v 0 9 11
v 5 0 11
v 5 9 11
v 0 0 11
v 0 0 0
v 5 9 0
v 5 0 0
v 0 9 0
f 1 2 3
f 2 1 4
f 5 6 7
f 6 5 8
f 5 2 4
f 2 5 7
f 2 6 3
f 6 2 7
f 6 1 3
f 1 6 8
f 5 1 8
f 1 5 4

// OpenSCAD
// Generated by SolidPython 1.0.1 on 2020-07-29 00:39:26


cube(size = [5, 9, 11]);
/***********************************************
*********      SolidPython code:      **********
************************************************
 
# import packages: SolidPython
from solid import *
from solid.utils import *
from itertools import chain, combinations


class Resize:

    def __init__(self, scad_file):
        self.scad_file = scad_file
        #self.scad_file = import_scad(scad_file)
        # cone/cylinder param:
        self.r1 = 0
        self.r2 = 0
        self.h = 0
        # rectangular prism param:
        self.w = 0
        self.l = 0
        # ellipse param:
        self.r = 0

    # import OpenScad code (file name corresponds to shape)


    # classify shape + parameters
    def assign(self, param1, param2, param3):
        if self.scad_file == 'cone.scad':
            self.r1 = param1
            self.r2 = param2
            self.h = param3
        elif self.scad_file == 'cylinder.scad':
            self.r1 = param1
            self.r2 = param2
            self.h = param3
        elif self.scad_file == 'rectangularPrism.scad':
            self.h = param1
            self.l = param2
            self.w = param3
        else:
            self.r = param1
            self.h = param2

    # resize parameters
    def iterate(self):
        x = range(3, 20, 2)
        i = 1
        if self.scad_file == 'cone.scad':
            tempList = list(combinations(x, 2))
            for temp in tempList:
                param1 = temp[0]
                param2 = temp[1]
                filepath = 'produced_scad_files/' + 'cone' + str(param1) + '_' + str(param2) + '_' + '.scad'
                scad_render_to_file(cylinder(h=param1, r1=param2, r2=0), filepath)

        elif self.scad_file == 'cylinder.scad':
            tempList = list(combinations(x, 3))
            for temp in tempList:
                param1 = temp[0]
                param2 = temp[1]
                filepath = 'produced_scad_files/' + 'cylinder' + str(param1) + '_' + str(param2) + '_' + '.scad'
                scad_render_to_file(cylinder(h=param1, r1=param2, r2=param2), filepath)

        elif self.scad_file == 'rectangularPrism.scad':
            tempList = list(combinations(x, 3))
            for temp in tempList:
                param1 = temp[0]
                param2 = temp[1]
                param3 = temp[2]
                filepath = 'produced_scad_files/' + 'rectangularPrism' + str(param1) + '_' + str(param2) + '_' + str(
                    param3) + '.scad'
                scad_render_to_file(cube(size=(param1, param2, param3)), filepath)

        elif self.scad_file == 'ellipse.scad':
            tempList = list(combinations(x, 4))
            for temp in tempList:
                param1 = temp[0]
                param2 = temp[1]
                param3 = temp[2]
                param4 = temp[3]
                filepath = 'produced_scad_files/' + 'ellipse' + str(param1) + '_' + str(param2) + '_' + str(param3) + '_' + str(param4) + '.scad'
                scad_render_to_file(scale([param1, param2, param3])(sphere(r=param4)), filepath)

    def render_to_scadfile(self):
        scad_render_to_file(scad, 'example.scad') 
 
************************************************/
